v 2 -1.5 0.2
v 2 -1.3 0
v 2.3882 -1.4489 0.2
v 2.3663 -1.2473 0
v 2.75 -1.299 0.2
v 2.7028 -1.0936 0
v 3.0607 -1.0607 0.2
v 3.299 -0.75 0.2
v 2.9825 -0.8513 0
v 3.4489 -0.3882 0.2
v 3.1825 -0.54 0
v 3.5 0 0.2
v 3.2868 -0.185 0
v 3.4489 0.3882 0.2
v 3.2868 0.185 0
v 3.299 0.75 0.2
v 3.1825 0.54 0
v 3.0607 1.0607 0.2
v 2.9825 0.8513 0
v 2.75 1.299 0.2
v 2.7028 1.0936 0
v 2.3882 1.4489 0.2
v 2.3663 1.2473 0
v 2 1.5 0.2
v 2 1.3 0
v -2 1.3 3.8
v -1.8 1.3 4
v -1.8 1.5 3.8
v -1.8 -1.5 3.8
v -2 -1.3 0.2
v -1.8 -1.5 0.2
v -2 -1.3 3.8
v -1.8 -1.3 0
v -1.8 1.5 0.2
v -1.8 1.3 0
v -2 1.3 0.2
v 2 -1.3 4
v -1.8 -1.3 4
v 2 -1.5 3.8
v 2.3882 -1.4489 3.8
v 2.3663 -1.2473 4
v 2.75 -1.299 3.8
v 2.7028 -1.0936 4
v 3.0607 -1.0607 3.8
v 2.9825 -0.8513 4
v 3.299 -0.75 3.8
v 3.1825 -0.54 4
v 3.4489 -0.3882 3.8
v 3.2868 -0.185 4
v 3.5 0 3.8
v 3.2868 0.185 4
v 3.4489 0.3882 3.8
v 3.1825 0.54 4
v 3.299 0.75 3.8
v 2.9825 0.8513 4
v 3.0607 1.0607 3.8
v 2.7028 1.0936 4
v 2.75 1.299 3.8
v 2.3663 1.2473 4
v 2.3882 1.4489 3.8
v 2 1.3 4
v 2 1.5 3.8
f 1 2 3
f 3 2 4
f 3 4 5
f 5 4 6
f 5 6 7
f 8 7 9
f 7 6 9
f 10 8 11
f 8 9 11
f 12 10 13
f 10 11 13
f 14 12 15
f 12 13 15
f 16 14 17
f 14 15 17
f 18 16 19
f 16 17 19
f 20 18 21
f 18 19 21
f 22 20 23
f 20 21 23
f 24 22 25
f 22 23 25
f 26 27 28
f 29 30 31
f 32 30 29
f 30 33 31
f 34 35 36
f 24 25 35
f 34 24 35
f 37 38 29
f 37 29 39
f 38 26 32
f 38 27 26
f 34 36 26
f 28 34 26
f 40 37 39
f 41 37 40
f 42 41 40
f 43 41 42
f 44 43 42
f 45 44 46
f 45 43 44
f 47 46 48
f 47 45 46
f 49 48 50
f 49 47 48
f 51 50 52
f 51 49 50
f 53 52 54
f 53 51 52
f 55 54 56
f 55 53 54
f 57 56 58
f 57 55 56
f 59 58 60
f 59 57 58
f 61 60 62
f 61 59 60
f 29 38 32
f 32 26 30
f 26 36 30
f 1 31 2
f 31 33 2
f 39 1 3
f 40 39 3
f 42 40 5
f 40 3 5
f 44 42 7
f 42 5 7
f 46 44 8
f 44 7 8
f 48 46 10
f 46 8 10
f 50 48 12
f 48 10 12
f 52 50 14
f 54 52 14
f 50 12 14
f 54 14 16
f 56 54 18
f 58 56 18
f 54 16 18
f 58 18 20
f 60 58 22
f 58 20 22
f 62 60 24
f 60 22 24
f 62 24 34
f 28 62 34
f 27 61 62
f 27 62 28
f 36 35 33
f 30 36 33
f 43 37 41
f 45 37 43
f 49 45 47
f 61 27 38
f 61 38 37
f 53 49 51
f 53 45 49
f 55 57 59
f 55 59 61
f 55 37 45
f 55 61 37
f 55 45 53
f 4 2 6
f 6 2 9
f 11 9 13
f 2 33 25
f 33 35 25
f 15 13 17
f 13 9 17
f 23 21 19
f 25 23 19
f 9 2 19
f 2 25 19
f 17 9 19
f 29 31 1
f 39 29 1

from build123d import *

# Parameters (mm, degrees)
EXTRUDE_1_DEPTH = 4
CHAMFER_1_SIZE  = 0.2


with BuildPart() as part:
    # 草图1 → 凸台-拉伸1 (new body)
    with BuildSketch(Plane.XY):
        with BuildLine():
            Line((-2, -1.5), (2, -1.5))
            ThreePointArc((2, -1.5), (3.5, 0), (2, 1.5))
            Line((2, 1.5), (-2, 1.5))
            Line((-2, 1.5), (-2, -1.5))
        make_face()
    extrude(amount=EXTRUDE_1_DEPTH)

    # 倒角1
    chamfer_1_edges = [part.edges().sort_by_distance(p)[0] for p in [
        (-2, 0, 4),
        (0, -1.5, 4),
        (3.5, 0, 4),
        (0, -1.5, 0),
        (-2, 0, 0),
        (0, 1.5, 0),
        (3.5, 0, 0),
        (-2, -1.5, 2),
        (-2, 1.5, 2),
        (0, 1.5, 4),
    ]]
    chamfer(chamfer_1_edges, length=CHAMFER_1_SIZE)


solid = part.part
